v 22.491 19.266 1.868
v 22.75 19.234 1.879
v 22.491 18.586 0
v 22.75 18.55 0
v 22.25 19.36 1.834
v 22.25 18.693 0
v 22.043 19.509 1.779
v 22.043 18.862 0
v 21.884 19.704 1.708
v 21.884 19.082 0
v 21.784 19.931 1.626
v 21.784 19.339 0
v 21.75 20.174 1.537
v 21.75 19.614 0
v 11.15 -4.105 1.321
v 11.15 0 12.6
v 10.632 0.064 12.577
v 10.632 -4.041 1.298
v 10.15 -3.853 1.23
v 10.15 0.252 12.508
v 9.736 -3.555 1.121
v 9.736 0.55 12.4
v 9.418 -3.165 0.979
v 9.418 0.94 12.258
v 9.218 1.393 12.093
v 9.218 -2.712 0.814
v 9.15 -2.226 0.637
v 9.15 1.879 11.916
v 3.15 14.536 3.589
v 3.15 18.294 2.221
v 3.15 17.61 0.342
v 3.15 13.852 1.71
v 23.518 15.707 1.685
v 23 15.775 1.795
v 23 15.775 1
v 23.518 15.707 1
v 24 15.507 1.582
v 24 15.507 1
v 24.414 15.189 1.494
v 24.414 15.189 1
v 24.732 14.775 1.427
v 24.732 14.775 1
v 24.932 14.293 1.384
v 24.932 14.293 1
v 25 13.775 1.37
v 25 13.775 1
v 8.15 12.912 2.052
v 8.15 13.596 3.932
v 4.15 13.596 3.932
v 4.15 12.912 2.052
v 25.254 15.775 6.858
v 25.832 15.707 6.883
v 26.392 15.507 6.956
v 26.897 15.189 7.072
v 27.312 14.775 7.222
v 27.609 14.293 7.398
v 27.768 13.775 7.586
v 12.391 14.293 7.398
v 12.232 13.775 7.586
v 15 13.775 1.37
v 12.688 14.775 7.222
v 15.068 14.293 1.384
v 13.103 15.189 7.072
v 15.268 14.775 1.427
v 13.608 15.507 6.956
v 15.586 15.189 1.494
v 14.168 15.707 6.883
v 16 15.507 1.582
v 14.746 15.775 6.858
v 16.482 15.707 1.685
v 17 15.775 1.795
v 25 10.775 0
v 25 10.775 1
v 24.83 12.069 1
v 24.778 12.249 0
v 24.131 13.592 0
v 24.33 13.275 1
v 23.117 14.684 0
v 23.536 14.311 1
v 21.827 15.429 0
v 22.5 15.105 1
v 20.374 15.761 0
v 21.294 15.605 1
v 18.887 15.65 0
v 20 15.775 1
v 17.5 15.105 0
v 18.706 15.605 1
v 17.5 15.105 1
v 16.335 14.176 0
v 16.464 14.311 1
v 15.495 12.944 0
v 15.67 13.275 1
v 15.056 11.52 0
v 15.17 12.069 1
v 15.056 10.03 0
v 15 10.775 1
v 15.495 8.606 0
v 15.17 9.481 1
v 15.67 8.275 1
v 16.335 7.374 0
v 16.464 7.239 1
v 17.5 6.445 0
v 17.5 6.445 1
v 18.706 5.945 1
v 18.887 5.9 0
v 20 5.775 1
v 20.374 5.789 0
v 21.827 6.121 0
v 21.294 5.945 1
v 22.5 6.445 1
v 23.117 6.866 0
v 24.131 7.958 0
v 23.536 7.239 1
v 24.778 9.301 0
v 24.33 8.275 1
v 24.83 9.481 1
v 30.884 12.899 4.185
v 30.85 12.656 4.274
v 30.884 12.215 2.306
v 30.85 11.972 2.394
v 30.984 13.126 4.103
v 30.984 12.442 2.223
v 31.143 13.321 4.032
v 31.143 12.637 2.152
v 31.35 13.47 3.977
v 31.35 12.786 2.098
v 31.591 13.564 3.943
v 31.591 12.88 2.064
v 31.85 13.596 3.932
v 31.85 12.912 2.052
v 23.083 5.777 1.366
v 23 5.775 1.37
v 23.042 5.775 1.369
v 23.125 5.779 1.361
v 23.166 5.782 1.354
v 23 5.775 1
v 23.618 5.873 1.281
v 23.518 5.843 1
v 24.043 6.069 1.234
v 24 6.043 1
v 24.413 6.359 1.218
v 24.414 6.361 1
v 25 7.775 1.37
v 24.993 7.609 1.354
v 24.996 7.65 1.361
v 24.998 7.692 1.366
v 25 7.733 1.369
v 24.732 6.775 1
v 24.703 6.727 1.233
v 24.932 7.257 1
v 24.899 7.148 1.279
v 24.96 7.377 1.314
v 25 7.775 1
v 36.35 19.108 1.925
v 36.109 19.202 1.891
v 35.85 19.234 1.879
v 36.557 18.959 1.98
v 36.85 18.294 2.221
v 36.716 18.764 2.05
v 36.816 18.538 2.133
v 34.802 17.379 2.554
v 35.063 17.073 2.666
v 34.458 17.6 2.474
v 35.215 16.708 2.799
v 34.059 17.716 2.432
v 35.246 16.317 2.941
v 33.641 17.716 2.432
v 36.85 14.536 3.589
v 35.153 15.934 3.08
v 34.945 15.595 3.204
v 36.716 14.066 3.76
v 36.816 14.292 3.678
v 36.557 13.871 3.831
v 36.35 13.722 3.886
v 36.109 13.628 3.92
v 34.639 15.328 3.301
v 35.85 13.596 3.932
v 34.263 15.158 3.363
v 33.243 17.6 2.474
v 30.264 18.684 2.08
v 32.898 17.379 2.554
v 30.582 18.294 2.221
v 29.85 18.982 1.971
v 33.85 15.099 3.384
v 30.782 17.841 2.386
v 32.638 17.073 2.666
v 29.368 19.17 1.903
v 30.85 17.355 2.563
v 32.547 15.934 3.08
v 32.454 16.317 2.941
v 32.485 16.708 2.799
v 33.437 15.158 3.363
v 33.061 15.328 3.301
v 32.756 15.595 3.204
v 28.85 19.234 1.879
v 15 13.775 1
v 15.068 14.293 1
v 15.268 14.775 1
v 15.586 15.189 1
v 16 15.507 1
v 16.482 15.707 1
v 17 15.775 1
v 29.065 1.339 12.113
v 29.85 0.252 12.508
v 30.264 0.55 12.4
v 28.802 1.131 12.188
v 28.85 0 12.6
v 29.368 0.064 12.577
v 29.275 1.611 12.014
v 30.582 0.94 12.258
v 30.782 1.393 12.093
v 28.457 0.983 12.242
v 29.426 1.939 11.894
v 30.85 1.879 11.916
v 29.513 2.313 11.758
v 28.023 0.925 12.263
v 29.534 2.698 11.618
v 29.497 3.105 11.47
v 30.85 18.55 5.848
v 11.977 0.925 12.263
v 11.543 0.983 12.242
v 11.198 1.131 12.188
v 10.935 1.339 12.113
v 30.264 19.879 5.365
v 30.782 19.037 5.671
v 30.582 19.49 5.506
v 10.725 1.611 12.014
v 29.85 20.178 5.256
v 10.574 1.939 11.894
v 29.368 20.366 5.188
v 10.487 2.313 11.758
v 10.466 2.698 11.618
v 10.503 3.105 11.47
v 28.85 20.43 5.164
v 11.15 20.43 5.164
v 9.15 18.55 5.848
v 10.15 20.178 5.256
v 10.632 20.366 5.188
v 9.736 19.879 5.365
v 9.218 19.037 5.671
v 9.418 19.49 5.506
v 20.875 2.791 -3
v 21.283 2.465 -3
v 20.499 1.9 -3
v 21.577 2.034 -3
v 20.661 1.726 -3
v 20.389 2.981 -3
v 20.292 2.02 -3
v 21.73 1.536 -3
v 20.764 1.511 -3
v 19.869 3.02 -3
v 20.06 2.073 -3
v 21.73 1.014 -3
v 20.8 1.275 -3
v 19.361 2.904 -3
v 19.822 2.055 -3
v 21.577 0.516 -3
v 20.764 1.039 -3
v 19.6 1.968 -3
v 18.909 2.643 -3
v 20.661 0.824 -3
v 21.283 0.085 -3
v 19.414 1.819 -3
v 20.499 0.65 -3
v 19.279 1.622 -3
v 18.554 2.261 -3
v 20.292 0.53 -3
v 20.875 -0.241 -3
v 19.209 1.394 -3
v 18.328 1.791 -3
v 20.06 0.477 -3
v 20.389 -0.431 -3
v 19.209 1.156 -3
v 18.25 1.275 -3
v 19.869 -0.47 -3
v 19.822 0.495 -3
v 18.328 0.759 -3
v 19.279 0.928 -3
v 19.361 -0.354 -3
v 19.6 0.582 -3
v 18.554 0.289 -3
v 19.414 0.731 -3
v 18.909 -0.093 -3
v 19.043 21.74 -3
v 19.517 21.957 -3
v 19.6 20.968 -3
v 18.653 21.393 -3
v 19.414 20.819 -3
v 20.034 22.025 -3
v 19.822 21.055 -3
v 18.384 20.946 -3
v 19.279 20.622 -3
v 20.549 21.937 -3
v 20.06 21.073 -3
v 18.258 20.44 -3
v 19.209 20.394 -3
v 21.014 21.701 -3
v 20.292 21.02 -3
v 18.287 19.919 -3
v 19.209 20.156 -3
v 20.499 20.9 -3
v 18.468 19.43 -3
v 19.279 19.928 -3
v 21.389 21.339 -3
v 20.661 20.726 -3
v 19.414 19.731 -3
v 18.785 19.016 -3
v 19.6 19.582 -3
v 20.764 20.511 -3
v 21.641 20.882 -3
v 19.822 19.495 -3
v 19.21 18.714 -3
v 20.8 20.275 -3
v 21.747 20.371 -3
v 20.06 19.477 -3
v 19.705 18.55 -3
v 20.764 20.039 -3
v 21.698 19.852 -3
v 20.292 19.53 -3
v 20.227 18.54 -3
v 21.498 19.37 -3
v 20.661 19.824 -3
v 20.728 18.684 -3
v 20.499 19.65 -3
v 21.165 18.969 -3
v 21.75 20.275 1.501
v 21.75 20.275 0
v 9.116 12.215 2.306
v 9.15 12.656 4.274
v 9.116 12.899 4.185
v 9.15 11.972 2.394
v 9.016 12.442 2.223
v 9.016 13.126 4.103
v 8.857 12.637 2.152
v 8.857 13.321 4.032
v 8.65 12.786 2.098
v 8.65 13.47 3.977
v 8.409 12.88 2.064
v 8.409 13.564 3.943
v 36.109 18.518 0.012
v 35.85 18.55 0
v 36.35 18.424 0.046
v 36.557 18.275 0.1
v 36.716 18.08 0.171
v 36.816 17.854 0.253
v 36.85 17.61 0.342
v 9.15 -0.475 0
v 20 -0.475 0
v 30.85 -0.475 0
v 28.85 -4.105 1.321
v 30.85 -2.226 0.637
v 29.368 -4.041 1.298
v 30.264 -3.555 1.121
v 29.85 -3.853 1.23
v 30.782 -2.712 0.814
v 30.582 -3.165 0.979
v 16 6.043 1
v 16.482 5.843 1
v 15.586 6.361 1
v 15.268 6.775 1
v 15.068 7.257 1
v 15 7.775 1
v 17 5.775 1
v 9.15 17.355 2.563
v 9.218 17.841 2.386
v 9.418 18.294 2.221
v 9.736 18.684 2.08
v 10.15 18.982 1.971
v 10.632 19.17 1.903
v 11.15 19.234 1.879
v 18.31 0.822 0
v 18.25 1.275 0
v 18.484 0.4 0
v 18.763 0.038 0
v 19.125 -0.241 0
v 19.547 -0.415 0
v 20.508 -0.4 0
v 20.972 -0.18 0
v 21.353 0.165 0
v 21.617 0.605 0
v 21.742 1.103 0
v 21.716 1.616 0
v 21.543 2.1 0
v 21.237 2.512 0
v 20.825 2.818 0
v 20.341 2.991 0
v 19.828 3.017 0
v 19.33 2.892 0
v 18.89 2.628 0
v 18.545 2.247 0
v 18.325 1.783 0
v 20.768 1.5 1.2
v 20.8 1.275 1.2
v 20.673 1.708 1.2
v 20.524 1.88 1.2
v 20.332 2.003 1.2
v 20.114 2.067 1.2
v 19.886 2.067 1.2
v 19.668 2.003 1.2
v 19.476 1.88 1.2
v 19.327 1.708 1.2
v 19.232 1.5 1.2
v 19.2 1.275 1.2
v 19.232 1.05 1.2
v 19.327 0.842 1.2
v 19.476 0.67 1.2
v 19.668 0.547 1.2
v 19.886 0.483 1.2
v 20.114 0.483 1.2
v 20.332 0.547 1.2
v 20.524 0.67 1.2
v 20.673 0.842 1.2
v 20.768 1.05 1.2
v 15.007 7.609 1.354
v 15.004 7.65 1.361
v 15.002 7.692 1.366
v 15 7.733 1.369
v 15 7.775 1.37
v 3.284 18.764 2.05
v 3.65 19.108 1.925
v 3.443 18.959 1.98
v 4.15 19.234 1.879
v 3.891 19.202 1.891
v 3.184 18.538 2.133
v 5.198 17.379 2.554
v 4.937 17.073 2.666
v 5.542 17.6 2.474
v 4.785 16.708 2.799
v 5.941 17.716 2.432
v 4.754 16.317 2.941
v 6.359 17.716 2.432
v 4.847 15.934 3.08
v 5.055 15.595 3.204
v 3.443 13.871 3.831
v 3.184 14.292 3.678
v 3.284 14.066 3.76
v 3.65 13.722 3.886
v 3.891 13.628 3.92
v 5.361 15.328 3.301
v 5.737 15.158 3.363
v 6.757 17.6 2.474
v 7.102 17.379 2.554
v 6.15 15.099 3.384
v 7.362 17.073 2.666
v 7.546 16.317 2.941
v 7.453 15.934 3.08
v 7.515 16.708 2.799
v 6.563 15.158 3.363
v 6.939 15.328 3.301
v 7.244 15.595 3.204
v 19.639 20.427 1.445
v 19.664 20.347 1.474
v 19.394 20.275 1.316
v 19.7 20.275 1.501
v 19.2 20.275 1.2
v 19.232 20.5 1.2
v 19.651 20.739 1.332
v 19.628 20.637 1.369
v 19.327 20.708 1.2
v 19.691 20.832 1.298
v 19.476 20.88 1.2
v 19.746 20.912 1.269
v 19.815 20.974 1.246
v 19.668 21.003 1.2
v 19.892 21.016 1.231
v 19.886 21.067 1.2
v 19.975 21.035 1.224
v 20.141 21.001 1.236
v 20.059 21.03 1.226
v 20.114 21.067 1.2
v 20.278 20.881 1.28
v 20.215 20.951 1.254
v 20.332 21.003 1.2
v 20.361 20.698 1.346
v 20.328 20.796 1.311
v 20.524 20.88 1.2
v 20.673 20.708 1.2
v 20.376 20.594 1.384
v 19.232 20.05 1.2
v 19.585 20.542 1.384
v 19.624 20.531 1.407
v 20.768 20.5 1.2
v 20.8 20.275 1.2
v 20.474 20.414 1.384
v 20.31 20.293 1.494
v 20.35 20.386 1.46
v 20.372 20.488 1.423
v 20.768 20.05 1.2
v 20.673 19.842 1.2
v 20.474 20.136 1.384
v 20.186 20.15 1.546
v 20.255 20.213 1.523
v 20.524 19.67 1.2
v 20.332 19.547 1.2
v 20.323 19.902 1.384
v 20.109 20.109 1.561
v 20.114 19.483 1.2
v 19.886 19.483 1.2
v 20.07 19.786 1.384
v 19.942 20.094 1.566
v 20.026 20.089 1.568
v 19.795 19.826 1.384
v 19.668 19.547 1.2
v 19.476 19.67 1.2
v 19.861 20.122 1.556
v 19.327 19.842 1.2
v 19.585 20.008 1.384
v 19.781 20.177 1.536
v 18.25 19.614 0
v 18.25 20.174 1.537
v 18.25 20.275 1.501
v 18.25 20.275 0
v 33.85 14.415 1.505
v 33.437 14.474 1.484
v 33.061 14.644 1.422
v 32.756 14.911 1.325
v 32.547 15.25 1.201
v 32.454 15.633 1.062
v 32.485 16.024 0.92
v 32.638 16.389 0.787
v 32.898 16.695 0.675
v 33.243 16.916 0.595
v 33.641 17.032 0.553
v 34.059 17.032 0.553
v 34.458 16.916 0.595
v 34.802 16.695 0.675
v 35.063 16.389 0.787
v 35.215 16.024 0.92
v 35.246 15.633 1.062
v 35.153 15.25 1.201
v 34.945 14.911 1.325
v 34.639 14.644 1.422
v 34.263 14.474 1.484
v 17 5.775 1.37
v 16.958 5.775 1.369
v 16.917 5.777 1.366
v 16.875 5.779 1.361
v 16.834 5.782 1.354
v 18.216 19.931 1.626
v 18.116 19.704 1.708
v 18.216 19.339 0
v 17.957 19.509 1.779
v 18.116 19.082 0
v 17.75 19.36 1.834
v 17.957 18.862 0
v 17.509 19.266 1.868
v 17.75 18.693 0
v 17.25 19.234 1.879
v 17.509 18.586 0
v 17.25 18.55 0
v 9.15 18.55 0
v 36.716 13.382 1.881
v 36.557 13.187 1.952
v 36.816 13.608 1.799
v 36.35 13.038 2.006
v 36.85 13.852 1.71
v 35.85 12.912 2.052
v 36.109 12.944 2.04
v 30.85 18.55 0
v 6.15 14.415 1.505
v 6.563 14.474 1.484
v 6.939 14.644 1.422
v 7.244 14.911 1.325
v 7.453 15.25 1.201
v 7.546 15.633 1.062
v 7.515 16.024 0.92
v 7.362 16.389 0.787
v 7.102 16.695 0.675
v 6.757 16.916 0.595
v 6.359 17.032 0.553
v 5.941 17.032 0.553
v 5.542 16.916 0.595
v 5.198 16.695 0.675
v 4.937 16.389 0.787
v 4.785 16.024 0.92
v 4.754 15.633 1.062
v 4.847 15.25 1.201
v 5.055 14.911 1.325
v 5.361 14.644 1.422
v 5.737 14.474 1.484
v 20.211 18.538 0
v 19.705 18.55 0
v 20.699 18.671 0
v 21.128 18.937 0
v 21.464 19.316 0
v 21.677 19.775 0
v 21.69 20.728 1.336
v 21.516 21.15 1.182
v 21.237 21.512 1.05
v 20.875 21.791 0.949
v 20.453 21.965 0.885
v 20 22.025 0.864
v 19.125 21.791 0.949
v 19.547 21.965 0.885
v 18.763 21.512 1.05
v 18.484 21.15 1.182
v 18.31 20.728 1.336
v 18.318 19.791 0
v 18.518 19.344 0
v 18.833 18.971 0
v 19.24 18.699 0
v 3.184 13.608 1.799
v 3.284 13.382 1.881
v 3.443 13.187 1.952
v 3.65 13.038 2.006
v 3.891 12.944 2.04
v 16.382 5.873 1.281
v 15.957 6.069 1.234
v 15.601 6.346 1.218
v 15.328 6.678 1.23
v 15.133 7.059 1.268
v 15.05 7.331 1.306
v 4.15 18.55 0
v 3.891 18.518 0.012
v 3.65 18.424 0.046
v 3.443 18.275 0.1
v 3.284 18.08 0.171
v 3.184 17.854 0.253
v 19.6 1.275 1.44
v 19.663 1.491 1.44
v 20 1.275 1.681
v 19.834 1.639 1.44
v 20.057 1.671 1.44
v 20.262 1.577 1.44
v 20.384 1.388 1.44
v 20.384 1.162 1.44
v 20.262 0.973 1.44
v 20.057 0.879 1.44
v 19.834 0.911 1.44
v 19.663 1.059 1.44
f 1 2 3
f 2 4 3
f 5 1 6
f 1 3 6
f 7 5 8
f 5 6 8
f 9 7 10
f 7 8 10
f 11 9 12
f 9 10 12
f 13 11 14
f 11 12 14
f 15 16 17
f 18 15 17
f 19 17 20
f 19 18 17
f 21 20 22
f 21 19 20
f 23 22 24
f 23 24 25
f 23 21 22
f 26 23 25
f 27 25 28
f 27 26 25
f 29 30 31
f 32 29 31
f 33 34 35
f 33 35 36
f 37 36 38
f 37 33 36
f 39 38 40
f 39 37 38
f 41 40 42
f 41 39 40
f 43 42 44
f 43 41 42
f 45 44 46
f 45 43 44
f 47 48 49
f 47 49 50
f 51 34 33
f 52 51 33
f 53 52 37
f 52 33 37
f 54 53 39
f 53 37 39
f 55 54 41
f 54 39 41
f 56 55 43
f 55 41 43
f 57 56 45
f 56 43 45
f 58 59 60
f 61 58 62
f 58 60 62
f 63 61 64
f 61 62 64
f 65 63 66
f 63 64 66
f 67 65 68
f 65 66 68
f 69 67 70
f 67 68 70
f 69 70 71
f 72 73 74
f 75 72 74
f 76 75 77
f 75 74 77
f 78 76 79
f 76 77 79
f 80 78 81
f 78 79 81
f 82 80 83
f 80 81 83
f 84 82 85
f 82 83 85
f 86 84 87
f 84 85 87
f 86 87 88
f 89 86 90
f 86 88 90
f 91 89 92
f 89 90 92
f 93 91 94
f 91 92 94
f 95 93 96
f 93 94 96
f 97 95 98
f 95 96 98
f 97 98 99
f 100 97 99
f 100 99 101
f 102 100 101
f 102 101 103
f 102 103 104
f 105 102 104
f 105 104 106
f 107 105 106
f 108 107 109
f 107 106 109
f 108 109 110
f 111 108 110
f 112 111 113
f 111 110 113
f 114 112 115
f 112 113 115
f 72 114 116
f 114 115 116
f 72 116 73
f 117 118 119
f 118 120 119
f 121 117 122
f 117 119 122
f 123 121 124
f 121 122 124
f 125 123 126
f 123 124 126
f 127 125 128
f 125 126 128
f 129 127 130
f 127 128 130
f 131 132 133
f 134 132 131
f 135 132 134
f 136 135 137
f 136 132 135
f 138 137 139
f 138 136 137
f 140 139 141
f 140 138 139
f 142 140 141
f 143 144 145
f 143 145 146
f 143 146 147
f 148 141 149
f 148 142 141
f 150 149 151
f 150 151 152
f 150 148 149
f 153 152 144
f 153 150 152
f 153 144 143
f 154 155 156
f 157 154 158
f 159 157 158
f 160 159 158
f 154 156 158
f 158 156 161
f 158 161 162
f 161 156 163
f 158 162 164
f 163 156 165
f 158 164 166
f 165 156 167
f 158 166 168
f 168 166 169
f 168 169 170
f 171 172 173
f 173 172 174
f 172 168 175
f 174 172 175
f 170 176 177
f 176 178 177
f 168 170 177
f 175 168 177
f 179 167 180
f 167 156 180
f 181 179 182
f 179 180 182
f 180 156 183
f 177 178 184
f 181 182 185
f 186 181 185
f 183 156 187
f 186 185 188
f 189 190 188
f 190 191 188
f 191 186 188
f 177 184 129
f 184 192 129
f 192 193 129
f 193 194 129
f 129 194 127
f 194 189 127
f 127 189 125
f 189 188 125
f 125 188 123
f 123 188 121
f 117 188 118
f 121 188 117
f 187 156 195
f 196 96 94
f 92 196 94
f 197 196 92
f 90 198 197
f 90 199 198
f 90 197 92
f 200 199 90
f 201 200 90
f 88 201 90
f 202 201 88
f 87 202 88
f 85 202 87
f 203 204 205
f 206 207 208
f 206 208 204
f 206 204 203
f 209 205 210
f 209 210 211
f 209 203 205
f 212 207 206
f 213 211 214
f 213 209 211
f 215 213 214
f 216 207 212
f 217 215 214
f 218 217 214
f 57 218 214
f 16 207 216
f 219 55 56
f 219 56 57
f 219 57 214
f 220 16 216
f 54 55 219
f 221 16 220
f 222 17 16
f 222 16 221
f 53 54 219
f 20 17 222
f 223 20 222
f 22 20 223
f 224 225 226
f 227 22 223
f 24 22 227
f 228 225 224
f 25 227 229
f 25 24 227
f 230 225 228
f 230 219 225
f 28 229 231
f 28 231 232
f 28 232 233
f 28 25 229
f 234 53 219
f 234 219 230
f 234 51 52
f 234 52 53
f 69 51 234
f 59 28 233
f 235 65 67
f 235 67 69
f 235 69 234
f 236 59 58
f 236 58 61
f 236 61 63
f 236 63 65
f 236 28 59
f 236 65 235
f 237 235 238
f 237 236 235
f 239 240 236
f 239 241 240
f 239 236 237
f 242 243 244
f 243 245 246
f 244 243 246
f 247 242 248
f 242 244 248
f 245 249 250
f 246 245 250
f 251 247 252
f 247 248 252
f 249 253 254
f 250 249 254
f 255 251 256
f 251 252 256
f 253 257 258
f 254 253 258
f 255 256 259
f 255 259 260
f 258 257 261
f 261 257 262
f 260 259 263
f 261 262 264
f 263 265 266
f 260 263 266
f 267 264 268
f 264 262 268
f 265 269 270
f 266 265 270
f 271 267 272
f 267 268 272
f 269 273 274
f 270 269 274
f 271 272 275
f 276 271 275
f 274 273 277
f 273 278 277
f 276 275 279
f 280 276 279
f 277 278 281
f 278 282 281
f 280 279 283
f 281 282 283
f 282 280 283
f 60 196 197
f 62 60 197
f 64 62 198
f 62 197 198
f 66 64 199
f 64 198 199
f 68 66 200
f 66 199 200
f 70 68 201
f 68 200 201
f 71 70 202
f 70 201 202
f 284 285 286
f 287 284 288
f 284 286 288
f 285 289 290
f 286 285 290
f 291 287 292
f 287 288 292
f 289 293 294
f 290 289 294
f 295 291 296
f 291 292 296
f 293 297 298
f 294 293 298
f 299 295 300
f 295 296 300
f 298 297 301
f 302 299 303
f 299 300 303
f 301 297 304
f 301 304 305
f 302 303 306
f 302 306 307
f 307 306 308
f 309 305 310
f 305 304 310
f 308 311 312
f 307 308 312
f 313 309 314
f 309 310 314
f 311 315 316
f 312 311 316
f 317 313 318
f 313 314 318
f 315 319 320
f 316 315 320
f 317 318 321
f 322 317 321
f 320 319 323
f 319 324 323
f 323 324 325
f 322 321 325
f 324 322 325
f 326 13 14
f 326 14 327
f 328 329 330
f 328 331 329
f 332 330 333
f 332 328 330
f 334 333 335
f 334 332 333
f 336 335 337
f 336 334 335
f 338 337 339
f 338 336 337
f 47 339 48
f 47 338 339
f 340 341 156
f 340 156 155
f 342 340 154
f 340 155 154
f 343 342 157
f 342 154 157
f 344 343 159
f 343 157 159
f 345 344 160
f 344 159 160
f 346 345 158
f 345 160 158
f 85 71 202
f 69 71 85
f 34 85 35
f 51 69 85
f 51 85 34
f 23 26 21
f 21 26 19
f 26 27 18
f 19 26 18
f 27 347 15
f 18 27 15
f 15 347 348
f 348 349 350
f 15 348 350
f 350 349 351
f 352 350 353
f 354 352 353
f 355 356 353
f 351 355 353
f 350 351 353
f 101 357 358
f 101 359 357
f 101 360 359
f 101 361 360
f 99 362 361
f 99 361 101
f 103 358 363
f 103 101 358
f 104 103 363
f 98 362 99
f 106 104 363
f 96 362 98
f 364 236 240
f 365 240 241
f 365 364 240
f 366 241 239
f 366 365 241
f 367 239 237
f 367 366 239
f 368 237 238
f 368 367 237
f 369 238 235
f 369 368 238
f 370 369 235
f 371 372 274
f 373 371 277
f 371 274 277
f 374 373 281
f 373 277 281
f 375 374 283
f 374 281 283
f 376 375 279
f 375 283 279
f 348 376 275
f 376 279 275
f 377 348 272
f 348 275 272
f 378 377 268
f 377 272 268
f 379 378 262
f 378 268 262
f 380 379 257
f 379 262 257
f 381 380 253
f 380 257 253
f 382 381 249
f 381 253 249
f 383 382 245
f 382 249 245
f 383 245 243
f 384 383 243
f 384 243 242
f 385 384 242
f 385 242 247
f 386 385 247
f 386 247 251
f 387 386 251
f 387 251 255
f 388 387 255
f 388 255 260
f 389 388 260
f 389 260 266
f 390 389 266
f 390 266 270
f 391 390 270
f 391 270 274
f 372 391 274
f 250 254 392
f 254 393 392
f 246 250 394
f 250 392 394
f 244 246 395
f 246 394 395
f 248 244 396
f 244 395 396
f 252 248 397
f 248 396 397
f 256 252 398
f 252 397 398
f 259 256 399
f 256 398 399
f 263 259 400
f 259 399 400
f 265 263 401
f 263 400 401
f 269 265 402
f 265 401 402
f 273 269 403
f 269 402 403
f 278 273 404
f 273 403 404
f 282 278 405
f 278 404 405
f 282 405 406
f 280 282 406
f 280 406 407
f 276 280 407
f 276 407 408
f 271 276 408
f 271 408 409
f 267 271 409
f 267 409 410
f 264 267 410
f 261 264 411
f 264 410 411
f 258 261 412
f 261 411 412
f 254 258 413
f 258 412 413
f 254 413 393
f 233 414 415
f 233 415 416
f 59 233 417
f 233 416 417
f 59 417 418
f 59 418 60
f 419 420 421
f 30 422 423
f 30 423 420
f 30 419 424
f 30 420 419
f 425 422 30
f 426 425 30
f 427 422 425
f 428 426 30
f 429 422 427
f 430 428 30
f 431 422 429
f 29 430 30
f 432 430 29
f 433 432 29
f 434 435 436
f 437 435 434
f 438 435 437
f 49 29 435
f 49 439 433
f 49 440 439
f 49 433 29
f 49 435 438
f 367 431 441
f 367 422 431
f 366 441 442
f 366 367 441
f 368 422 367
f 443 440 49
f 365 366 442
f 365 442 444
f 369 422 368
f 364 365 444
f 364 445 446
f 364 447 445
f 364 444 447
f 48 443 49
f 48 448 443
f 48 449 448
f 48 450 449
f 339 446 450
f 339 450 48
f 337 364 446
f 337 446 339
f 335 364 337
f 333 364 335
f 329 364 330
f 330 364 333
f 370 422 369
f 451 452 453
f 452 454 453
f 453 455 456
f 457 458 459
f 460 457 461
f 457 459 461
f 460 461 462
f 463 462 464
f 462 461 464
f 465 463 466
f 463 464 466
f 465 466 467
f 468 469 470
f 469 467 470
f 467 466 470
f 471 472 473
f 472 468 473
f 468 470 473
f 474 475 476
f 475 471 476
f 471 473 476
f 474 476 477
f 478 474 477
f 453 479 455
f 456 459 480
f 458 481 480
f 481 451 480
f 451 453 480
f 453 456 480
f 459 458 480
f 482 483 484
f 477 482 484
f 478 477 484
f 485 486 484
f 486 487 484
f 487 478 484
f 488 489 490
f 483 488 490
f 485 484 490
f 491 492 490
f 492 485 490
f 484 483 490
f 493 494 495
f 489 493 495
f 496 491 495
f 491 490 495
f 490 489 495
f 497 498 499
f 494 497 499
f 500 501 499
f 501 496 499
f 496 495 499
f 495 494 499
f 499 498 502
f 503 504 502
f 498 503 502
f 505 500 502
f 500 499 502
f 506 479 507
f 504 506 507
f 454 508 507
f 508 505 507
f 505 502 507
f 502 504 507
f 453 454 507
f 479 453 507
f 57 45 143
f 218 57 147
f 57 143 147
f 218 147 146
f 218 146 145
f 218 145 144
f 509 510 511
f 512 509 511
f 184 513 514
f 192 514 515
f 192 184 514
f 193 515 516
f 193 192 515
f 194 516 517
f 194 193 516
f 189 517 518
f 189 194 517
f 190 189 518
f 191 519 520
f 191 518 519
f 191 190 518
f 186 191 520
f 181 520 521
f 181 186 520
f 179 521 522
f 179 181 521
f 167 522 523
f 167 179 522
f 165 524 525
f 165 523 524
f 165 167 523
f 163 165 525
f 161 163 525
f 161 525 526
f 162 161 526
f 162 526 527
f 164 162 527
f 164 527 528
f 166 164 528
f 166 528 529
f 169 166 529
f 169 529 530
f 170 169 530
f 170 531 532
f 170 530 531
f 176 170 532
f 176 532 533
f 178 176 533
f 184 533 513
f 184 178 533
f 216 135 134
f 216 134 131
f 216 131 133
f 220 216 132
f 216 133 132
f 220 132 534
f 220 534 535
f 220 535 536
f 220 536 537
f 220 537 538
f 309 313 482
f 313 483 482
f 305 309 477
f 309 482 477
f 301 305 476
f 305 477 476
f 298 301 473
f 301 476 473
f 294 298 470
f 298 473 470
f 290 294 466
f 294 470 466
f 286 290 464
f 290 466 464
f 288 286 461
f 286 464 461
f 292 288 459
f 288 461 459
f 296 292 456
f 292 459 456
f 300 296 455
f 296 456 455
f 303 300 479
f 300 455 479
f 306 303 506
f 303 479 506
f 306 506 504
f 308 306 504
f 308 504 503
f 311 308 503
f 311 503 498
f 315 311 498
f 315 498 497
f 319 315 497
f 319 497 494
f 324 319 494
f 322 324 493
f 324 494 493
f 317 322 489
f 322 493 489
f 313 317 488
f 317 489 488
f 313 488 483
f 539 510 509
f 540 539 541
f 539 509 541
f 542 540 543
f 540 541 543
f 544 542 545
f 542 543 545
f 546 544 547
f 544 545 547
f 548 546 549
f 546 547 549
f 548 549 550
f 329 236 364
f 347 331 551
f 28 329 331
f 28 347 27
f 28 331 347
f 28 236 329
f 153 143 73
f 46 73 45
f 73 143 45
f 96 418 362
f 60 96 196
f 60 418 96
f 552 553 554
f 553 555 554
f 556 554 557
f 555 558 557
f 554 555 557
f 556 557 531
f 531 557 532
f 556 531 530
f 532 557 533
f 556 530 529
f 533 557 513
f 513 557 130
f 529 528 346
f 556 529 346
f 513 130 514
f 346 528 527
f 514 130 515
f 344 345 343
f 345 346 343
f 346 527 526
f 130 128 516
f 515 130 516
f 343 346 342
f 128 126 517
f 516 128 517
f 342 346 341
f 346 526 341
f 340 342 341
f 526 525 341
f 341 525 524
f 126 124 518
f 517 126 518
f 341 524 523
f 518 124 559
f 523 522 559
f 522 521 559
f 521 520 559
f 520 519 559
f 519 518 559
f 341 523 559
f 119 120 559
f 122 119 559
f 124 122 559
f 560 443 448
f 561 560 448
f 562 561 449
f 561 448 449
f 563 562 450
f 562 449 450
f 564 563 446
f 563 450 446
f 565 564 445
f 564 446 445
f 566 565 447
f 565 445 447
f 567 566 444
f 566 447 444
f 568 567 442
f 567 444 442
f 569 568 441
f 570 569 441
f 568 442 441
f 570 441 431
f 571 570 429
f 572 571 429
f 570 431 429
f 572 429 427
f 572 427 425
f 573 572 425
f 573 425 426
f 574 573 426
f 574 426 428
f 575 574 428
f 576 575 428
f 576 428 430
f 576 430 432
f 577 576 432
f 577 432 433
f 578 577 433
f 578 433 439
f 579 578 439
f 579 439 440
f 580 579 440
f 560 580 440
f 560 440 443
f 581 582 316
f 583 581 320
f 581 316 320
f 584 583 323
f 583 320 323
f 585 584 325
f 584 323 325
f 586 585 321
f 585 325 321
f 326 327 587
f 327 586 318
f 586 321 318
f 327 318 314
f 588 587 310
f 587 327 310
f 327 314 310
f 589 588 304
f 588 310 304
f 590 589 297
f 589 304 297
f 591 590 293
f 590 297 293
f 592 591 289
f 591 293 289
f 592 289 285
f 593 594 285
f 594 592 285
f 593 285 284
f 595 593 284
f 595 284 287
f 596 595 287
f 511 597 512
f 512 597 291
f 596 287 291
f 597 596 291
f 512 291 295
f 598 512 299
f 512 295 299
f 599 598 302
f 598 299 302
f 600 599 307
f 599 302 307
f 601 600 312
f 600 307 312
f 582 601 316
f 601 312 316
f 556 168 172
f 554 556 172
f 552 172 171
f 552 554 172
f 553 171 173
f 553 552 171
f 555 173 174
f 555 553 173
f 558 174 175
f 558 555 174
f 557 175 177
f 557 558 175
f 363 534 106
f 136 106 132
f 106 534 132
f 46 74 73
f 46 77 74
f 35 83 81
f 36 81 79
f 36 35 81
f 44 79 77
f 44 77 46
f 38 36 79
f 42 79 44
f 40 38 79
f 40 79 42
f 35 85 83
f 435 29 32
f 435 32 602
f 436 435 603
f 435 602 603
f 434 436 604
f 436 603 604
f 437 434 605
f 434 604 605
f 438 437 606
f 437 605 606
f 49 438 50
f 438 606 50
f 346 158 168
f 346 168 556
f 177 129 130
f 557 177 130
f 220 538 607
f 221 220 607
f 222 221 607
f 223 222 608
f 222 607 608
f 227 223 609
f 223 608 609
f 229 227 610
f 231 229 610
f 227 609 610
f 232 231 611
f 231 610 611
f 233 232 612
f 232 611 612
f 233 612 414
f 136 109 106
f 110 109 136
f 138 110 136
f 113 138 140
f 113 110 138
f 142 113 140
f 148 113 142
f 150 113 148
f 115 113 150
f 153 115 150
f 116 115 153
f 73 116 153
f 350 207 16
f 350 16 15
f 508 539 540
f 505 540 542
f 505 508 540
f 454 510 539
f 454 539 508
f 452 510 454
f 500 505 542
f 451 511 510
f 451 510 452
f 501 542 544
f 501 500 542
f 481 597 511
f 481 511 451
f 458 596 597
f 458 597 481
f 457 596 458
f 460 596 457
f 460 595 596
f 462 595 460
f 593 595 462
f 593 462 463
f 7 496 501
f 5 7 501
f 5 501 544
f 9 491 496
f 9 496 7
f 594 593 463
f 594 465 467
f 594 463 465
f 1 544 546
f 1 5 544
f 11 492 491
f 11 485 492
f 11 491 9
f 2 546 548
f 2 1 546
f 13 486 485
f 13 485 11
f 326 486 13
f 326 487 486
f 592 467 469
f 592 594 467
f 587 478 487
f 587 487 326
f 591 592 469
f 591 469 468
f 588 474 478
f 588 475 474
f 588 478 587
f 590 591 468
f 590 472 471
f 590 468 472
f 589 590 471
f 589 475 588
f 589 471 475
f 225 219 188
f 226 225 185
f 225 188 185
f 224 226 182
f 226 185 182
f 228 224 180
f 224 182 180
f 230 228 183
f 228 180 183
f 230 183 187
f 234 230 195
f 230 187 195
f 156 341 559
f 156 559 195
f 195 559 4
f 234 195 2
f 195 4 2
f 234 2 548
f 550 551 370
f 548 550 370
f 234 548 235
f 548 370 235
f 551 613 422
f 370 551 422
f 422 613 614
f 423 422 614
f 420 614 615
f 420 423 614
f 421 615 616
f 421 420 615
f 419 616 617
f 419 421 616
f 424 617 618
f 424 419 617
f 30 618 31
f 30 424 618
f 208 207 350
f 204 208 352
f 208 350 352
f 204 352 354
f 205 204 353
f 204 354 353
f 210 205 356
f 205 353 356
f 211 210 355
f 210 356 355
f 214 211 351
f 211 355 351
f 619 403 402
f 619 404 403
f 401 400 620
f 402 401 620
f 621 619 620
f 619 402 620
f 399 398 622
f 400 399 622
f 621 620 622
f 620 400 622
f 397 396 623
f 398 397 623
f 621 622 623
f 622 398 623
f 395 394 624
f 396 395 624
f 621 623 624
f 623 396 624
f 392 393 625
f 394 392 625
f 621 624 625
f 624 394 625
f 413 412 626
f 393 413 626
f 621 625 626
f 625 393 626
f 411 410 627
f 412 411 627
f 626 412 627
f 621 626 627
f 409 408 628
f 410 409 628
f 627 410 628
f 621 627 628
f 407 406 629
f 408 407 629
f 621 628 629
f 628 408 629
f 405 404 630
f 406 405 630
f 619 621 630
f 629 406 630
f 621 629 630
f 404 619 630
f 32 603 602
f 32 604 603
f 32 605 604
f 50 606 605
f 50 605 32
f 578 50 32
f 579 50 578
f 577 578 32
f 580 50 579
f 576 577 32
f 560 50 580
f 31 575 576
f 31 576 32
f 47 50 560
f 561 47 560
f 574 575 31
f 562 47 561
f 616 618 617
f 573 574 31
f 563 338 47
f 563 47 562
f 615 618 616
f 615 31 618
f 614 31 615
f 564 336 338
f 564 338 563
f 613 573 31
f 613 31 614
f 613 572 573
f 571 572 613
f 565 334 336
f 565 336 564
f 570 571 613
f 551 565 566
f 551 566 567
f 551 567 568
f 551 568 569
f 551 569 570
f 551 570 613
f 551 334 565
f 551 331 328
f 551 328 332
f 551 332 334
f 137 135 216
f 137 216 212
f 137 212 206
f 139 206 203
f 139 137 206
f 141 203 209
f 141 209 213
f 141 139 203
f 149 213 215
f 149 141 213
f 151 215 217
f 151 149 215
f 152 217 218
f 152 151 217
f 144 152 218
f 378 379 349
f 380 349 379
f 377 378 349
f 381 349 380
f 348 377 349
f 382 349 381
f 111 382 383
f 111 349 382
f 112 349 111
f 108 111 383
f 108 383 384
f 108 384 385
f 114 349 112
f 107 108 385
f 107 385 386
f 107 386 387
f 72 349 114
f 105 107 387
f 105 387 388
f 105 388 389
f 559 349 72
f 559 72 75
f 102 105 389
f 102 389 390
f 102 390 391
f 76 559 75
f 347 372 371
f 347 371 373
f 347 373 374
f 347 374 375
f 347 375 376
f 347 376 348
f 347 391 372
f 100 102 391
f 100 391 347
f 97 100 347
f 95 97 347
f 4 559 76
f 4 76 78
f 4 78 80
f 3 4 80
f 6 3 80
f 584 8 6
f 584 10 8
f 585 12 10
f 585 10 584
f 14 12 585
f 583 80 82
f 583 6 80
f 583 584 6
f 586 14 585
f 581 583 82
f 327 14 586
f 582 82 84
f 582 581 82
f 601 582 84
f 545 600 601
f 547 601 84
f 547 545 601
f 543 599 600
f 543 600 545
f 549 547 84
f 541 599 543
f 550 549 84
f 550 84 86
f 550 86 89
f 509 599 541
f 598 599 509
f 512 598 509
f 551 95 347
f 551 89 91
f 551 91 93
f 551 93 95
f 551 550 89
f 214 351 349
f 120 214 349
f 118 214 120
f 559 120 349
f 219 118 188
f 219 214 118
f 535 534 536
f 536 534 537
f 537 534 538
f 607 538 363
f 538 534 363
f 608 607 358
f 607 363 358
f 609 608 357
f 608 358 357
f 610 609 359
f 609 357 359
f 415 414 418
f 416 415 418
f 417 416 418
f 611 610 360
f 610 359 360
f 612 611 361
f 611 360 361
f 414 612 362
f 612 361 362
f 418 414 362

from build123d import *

# Parameters (mm, degrees)
BOSS_EXTRUDE1_DEPTH   = 12.6
SKETCH2_R             = 5.0000000000000036
CUT_EXTRUDE1_DEPTH    = 48.150424176246815
SKETCH3_W             = 10.00000000000001
SKETCH3_H             = 10.000000000000007
CUT_EXTRUDE2_DEPTH    = 11.6
CHAMFER1_SIZE         = 5
CHAMFER1_SIZE2        = 11.230183869521158
CUT_EXTRUDE3_DEPTH    = 48.150424176246815
BOSS_EXTRUDE2_DEPTH   = 40
SKETCH6_R             = 1.7500000000000004
SKETCH6_R_2           = 1.7500000000000002
BOSS_EXTRUDE3_DEPTH   = 3
CUT_EXTRUDE4_DEPTH    = 48.369406002186686
CUT_EXTRUDE5_DEPTH    = 47.07236166447865
BOSS_EXTRUDE4_DEPTH   = 6
SKETCH12_R            = 1.4000000000000001
CUT_EXTRUDE6_DEPTH    = 38.90502227131958
BOSS_EXTRUDE5_REACH   = 44.93
SKETCH14_W            = 3.5000000000000036
SKETCH14_H            = 3.265431857231029
CUT_EXTRUDE7_REACH    = 46.879
CUT_EXTRUDE8_REACH    = 46.879
M2_TAPPED_HOLE1_D     = 1.6
M2_TAPPED_HOLE1_DEPTH = 4.2
M2_TAPPED_HOLE1_TIP   = 0.48068849522204826
FILLET1_R             = 1
FILLET2_R             = 2
FILLET4_R             = 2


with BuildPart() as part:
    # Sketch1 → Boss-Extrude1 (new body)
    with BuildSketch(Plane.XY):
        Polygon((0, 0), (40, 0), (39.99999999999999, 21.550000000000004), (0, 21.550000000000004), align=None)
    extrude(amount=BOSS_EXTRUDE1_DEPTH)

    # Sketch2 → Cut-Extrude1 (cut, through all)
    with BuildSketch(Plane.XY.offset(12.6)):
        with Locations((19.999999999999996, 10.775000000000004)):
            Circle(SKETCH2_R)
    extrude(amount=-CUT_EXTRUDE1_DEPTH, mode=Mode.SUBTRACT)

    # Sketch3 → Cut-Extrude2 (cut)
    with BuildSketch(Plane.XY.offset(12.6)):
        with Locations((20, 10.775000000000002)):
            Rectangle(SKETCH3_W, SKETCH3_H)
    extrude(amount=-CUT_EXTRUDE2_DEPTH, mode=Mode.SUBTRACT)

    # Chamfer1
    chamfer1_edges = [part.edges().sort_by_distance(p)[0] for p in [
        (14.999999999999993, 10.775000000000002, 12.6),
        (19.999999999999996, 5.7749999999999995, 12.6),
        (25, 10.775000000000004, 12.6),
    ]]
    chamfer1_side = [part.faces().sort_by_distance(p)[0] for p in [
        (20, 0.45435696319083746, 12.6),
    ]]
    chamfer(chamfer1_edges, length=CHAMFER1_SIZE, length2=CHAMFER1_SIZE2, reference=chamfer1_side[0])

    # Sketch4 → Cut-Extrude3 (cut, through all)
    with BuildSketch(Plane.ZY):
        Polygon((12.6, 0), (5.164224911806891, 20.42962415095372), (0, 18.550000000000004), (0, 21.550000000000004), (12.6, 21.550000000000004), align=None)
    extrude(amount=-CUT_EXTRUDE3_DEPTH, mode=Mode.SUBTRACT)

    # Sketch5 → Boss-Extrude2 (add)
    with BuildSketch(Plane.ZY):
        Polygon((12.6, 0), (0, -4.5860249517541645), (0, 0), align=None)
    extrude(amount=-BOSS_EXTRUDE2_DEPTH)

    # Sketch6 → Boss-Extrude3 (add)
    with BuildSketch(Plane.XY.offset(-2.9999999999999996)):
        with Locations(Location((19.999999999999996, 20.275000000000002, 0), (0, 0, 260.303678946))):
            Circle(SKETCH6_R)
        with Locations(Location((20, 1.275000000000002, 0), (0, 0, 180))):
            Circle(SKETCH6_R_2)
    extrude(amount=BOSS_EXTRUDE3_DEPTH)

    # Sketch7 → Cut-Extrude4 (cut, through all)
    with BuildSketch(Plane(origin=(40, 1.288e-14, 0), x_dir=(0, 0, -1), z_dir=(1, 3.2e-16, 0))):
        Polygon((0, -4.586024951754178), (0, -0.47500000000000464), (-1.3212579510498954, -4.105126385784462), align=None)
    extrude(amount=-CUT_EXTRUDE4_DEPTH, mode=Mode.SUBTRACT)

    # Sketch8 → Cut-Extrude5 (cut, through all)
    with BuildSketch(Plane(origin=(0, 4.049561941025207, 11.126079991649561), x_dir=(1, 0, 0), z_dir=(0, 0.34202014332566943, 0.9396926207859082))):
        Polygon((0, 17.4312981155786), (9.149876173671583, 17.4312981155786), (9.149876173671586, -4.309453805903435), (0, -4.309453805903436), align=None)
        Polygon((40, -4.309453805903436), (30.850123826328417, -4.309453805903435), (30.850123826328417, 17.4312981155786), (40, 17.4312981155786), align=None)
    extrude(amount=-CUT_EXTRUDE5_DEPTH, mode=Mode.SUBTRACT)

    # Sketch11 → Boss-Extrude4 (add)
    with BuildSketch(Plane.ZY.offset(-9.149876173671585)):
        Polygon((4.8e-16, 18.550000000000008), (1.879385241571817, 19.234040286651346), (3.9315061015258332, 13.595884561935897), (2.0521208599540164, 12.911844275284558), align=None)
    boss_extrude4 = extrude(amount=BOSS_EXTRUDE4_DEPTH)

    # Sketch12 → Cut-Extrude6 (cut, through all)
    with BuildSketch(Plane(origin=(0, 2.8539780767228278, 7.841240321414484), x_dir=(1, 0, 0), z_dir=(0, 0.3420201433256694, 0.9396926207859083))):
        with Locations(Location((6.149876173671584, 14.431298115578603, 0), (0, 0, 270))):
            Circle(SKETCH12_R)
    cut_extrude6 = extrude(amount=-CUT_EXTRUDE6_DEPTH, mode=Mode.SUBTRACT)

    # Mirror1: Boss-Extrude4, Cut-Extrude6 across plane
    add(boss_extrude4.mirror(Plane.ZY.offset(-19.999999999999996)))
    add(cut_extrude6.mirror(Plane.ZY.offset(-19.999999999999996)), mode=Mode.SUBTRACT)

    # Boss-Extrude5: up to this plane
    boss_extrude5_end = Plane(origin=(0, 0, 0), z_dir=(0, 0, -1))
    # Sketch14 → Boss-Extrude5 (add, up to the surface)
    with BuildSketch(Plane(origin=(0, 2.8539780767228278, 7.841240321414484), x_dir=(1, 0, 0), z_dir=(0, 0.3420201433256694, 0.9396926207859083)), mode=Mode.PRIVATE) as boss_extrude5_sk1:
        with Locations((20, 19.064014044194117)):
            Rectangle(SKETCH14_W, SKETCH14_H)
    boss_extrude5_tool1 = split(extrude(boss_extrude5_sk1.sketch, amount=-BOSS_EXTRUDE5_REACH, mode=Mode.PRIVATE), bisect_by=boss_extrude5_end, keep=Keep.BOTH, mode=Mode.PRIVATE)
    add(boss_extrude5_tool1.solids().sort_by_distance((20, 20.768291, 1.320964))[0])

    # Cut-Extrude7: up to this plane
    cut_extrude7_end = Plane(origin=(0, 2.8539780767228256, 7.841240321414483), z_dir=(0, -0.3420201433256692, -0.9396926207859083))
    # Sketch15 → Cut-Extrude7 (cut, up to the surface)
    with BuildSketch(Plane(origin=(0, 0, 0), x_dir=(-1, 0, 0), z_dir=(0, 0, -1)), mode=Mode.PRIVATE) as cut_extrude7_sk1:
        with BuildLine():
            Line((-19.999999999999996, 22.025000000000006), (-21.75, 22.02500000000001))
            Line((-21.75, 22.02500000000001), (-21.750000000000004, 20.275000000000002))
            ThreePointArc((-21.750000000000004, 20.275000000000002), (-21.237436867076458, 21.512436867076463), (-19.999999999999996, 22.025000000000006))
        make_face()
    cut_extrude7_tool1 = split(extrude(cut_extrude7_sk1.sketch, amount=-CUT_EXTRUDE7_REACH, mode=Mode.PRIVATE), bisect_by=cut_extrude7_end, keep=Keep.BOTH, mode=Mode.PRIVATE)
    add(cut_extrude7_tool1.solids().sort_by_distance((21.359106, 21.634106, 0))[0], mode=Mode.SUBTRACT)

    # Cut-Extrude8: up to this plane
    cut_extrude8_end = Plane(origin=(0, 2.8539780767228256, 7.841240321414483), z_dir=(0, -0.3420201433256692, -0.9396926207859083))
    # Sketch16 → Cut-Extrude8 (cut, up to the surface)
    with BuildSketch(Plane(origin=(0, 0, 0), x_dir=(-1, 0, 0), z_dir=(0, 0, -1)), mode=Mode.PRIVATE) as cut_extrude8_sk1:
        with BuildLine():
            Line((-18.249999999999993, 20.275000000000002), (-18.249999999999996, 22.02500000000001))
            Line((-18.249999999999996, 22.02500000000001), (-19.999999999999996, 22.025000000000006))
            ThreePointArc((-19.999999999999996, 22.025000000000006), (-18.762563132923535, 21.512436867076463), (-18.249999999999993, 20.275000000000002))
        make_face()
    cut_extrude8_tool1 = split(extrude(cut_extrude8_sk1.sketch, amount=-CUT_EXTRUDE8_REACH, mode=Mode.PRIVATE), bisect_by=cut_extrude8_end, keep=Keep.BOTH, mode=Mode.PRIVATE)
    add(cut_extrude8_tool1.solids().sort_by_distance((18.640894, 21.634106, 0))[0], mode=Mode.SUBTRACT)


with BuildPart() as body_2:
    # of the pieces the cut leaves, the one that is kept (cut_extrude8_keep)
    add(part.part.solids().sort_by_distance((30.850123826, -0.475, 0))[0])

    # M2 Tapped Hole1
    with Locations(Plane(origin=(20, 20.275, -3), x_dir=(-1, 0, 0), z_dir=(0, 0, -1))):
        with Locations((0, 0), (0, -19)):
            Hole(M2_TAPPED_HOLE1_D / 2, depth=M2_TAPPED_HOLE1_DEPTH)
            with Locations((0, 0, -(M2_TAPPED_HOLE1_DEPTH + M2_TAPPED_HOLE1_TIP / 2))):  # 118° drill point
                Cone(0, M2_TAPPED_HOLE1_D / 2, M2_TAPPED_HOLE1_TIP, mode=Mode.SUBTRACT)

    # Fillet1
    fillet1_edges = [body_2.edges().sort_by_distance(p)[0] for p in [
        (18.249999999999996, 18.89202014332568, 0.9396926207859103),
        (21.75, 18.89202014332568, 0.9396926207859103),
        (36.85012382632841, 18.892020143325677, 0.9396926207859077),
        (30.850123826328407, 13.253864418610231, 2.9918134807399235),
        (9.149876173671583, 13.25386441861023, 2.9918134807399244),
        (3.149876173671583, 13.253864418610227, 2.991813480739925),
        (3.149876173671582, 18.892020143325677, 0.9396926207859085),
        (36.85012382632841, 13.253864418610231, 2.991813480739924),
    ]]
    fillet(fillet1_edges, radius=FILLET1_R)

    # Fillet2
    fillet2_edges = [body_2.edges().sort_by_distance(p)[0] for p in [
        (9.149876173671586, -2.052563192892223, 6.960628975524948),
        (9.149876173671583, 19.831832218802536, 3.521805076689357),
        (30.850123826328417, -2.0525631928922223, 6.9606289755249495),
        (30.850123826328417, 19.831832218802536, 3.5218050766893576),
    ]]
    fillet(fillet2_edges, radius=FILLET2_R)

    # Fillet4
    fillet4_edges = [body_2.edges().sort_by_distance(p)[0] for p in [
        (26.22183071260031, 15.775000000000007, 4.114092842464741),
    ]]
    fillet(fillet4_edges, radius=FILLET4_R)
    fillet4_2_edges = [body_2.edges().sort_by_distance(p)[0] for p in [
        (13.778169287399688, 15.775000000000006, 4.114092842464743),
    ]]
    fillet(fillet4_2_edges, radius=FILLET4_R)
    fillet4_3_edges = [body_2.edges().sort_by_distance(p)[0] for p in [
        (14.999999999999993, 15.775000000000007, 1.184908065239421),
    ]]
    fillet(fillet4_3_edges, radius=FILLET4_R)
    fillet4_4_edges = [body_2.edges().sort_by_distance(p)[0] for p in [
        (25, 15.775000000000007, 1.184908065239421),
    ]]
    fillet(fillet4_4_edges, radius=FILLET4_R)
    fillet4_5_edges = [body_2.edges().sort_by_distance(p)[0] for p in [
        (12.574938086835799, 3.3499380868358024, 6.81659436644018),
    ]]
    fillet(fillet4_5_edges, radius=FILLET4_R)
    fillet4_6_edges = [body_2.edges().sort_by_distance(p)[0] for p in [
        (27.425061913164196, 3.349938086835803, 6.816594366440178),
    ]]
    fillet(fillet4_6_edges, radius=FILLET4_R)
    fillet4_7_edges = [body_2.edges().sort_by_distance(p)[0] for p in [
        (25, 5.7749999999999995, 1.7667114299152384),
    ]]
    fillet(fillet4_7_edges, radius=FILLET4_R)
    fillet4_8_edges = [body_2.edges().sort_by_distance(p)[0] for p in [
        (14.999999999999993, 5.7749999999999995, 1.766711429915226),
    ]]
    fillet(fillet4_8_edges, radius=FILLET4_R)


solid = body_2.part
